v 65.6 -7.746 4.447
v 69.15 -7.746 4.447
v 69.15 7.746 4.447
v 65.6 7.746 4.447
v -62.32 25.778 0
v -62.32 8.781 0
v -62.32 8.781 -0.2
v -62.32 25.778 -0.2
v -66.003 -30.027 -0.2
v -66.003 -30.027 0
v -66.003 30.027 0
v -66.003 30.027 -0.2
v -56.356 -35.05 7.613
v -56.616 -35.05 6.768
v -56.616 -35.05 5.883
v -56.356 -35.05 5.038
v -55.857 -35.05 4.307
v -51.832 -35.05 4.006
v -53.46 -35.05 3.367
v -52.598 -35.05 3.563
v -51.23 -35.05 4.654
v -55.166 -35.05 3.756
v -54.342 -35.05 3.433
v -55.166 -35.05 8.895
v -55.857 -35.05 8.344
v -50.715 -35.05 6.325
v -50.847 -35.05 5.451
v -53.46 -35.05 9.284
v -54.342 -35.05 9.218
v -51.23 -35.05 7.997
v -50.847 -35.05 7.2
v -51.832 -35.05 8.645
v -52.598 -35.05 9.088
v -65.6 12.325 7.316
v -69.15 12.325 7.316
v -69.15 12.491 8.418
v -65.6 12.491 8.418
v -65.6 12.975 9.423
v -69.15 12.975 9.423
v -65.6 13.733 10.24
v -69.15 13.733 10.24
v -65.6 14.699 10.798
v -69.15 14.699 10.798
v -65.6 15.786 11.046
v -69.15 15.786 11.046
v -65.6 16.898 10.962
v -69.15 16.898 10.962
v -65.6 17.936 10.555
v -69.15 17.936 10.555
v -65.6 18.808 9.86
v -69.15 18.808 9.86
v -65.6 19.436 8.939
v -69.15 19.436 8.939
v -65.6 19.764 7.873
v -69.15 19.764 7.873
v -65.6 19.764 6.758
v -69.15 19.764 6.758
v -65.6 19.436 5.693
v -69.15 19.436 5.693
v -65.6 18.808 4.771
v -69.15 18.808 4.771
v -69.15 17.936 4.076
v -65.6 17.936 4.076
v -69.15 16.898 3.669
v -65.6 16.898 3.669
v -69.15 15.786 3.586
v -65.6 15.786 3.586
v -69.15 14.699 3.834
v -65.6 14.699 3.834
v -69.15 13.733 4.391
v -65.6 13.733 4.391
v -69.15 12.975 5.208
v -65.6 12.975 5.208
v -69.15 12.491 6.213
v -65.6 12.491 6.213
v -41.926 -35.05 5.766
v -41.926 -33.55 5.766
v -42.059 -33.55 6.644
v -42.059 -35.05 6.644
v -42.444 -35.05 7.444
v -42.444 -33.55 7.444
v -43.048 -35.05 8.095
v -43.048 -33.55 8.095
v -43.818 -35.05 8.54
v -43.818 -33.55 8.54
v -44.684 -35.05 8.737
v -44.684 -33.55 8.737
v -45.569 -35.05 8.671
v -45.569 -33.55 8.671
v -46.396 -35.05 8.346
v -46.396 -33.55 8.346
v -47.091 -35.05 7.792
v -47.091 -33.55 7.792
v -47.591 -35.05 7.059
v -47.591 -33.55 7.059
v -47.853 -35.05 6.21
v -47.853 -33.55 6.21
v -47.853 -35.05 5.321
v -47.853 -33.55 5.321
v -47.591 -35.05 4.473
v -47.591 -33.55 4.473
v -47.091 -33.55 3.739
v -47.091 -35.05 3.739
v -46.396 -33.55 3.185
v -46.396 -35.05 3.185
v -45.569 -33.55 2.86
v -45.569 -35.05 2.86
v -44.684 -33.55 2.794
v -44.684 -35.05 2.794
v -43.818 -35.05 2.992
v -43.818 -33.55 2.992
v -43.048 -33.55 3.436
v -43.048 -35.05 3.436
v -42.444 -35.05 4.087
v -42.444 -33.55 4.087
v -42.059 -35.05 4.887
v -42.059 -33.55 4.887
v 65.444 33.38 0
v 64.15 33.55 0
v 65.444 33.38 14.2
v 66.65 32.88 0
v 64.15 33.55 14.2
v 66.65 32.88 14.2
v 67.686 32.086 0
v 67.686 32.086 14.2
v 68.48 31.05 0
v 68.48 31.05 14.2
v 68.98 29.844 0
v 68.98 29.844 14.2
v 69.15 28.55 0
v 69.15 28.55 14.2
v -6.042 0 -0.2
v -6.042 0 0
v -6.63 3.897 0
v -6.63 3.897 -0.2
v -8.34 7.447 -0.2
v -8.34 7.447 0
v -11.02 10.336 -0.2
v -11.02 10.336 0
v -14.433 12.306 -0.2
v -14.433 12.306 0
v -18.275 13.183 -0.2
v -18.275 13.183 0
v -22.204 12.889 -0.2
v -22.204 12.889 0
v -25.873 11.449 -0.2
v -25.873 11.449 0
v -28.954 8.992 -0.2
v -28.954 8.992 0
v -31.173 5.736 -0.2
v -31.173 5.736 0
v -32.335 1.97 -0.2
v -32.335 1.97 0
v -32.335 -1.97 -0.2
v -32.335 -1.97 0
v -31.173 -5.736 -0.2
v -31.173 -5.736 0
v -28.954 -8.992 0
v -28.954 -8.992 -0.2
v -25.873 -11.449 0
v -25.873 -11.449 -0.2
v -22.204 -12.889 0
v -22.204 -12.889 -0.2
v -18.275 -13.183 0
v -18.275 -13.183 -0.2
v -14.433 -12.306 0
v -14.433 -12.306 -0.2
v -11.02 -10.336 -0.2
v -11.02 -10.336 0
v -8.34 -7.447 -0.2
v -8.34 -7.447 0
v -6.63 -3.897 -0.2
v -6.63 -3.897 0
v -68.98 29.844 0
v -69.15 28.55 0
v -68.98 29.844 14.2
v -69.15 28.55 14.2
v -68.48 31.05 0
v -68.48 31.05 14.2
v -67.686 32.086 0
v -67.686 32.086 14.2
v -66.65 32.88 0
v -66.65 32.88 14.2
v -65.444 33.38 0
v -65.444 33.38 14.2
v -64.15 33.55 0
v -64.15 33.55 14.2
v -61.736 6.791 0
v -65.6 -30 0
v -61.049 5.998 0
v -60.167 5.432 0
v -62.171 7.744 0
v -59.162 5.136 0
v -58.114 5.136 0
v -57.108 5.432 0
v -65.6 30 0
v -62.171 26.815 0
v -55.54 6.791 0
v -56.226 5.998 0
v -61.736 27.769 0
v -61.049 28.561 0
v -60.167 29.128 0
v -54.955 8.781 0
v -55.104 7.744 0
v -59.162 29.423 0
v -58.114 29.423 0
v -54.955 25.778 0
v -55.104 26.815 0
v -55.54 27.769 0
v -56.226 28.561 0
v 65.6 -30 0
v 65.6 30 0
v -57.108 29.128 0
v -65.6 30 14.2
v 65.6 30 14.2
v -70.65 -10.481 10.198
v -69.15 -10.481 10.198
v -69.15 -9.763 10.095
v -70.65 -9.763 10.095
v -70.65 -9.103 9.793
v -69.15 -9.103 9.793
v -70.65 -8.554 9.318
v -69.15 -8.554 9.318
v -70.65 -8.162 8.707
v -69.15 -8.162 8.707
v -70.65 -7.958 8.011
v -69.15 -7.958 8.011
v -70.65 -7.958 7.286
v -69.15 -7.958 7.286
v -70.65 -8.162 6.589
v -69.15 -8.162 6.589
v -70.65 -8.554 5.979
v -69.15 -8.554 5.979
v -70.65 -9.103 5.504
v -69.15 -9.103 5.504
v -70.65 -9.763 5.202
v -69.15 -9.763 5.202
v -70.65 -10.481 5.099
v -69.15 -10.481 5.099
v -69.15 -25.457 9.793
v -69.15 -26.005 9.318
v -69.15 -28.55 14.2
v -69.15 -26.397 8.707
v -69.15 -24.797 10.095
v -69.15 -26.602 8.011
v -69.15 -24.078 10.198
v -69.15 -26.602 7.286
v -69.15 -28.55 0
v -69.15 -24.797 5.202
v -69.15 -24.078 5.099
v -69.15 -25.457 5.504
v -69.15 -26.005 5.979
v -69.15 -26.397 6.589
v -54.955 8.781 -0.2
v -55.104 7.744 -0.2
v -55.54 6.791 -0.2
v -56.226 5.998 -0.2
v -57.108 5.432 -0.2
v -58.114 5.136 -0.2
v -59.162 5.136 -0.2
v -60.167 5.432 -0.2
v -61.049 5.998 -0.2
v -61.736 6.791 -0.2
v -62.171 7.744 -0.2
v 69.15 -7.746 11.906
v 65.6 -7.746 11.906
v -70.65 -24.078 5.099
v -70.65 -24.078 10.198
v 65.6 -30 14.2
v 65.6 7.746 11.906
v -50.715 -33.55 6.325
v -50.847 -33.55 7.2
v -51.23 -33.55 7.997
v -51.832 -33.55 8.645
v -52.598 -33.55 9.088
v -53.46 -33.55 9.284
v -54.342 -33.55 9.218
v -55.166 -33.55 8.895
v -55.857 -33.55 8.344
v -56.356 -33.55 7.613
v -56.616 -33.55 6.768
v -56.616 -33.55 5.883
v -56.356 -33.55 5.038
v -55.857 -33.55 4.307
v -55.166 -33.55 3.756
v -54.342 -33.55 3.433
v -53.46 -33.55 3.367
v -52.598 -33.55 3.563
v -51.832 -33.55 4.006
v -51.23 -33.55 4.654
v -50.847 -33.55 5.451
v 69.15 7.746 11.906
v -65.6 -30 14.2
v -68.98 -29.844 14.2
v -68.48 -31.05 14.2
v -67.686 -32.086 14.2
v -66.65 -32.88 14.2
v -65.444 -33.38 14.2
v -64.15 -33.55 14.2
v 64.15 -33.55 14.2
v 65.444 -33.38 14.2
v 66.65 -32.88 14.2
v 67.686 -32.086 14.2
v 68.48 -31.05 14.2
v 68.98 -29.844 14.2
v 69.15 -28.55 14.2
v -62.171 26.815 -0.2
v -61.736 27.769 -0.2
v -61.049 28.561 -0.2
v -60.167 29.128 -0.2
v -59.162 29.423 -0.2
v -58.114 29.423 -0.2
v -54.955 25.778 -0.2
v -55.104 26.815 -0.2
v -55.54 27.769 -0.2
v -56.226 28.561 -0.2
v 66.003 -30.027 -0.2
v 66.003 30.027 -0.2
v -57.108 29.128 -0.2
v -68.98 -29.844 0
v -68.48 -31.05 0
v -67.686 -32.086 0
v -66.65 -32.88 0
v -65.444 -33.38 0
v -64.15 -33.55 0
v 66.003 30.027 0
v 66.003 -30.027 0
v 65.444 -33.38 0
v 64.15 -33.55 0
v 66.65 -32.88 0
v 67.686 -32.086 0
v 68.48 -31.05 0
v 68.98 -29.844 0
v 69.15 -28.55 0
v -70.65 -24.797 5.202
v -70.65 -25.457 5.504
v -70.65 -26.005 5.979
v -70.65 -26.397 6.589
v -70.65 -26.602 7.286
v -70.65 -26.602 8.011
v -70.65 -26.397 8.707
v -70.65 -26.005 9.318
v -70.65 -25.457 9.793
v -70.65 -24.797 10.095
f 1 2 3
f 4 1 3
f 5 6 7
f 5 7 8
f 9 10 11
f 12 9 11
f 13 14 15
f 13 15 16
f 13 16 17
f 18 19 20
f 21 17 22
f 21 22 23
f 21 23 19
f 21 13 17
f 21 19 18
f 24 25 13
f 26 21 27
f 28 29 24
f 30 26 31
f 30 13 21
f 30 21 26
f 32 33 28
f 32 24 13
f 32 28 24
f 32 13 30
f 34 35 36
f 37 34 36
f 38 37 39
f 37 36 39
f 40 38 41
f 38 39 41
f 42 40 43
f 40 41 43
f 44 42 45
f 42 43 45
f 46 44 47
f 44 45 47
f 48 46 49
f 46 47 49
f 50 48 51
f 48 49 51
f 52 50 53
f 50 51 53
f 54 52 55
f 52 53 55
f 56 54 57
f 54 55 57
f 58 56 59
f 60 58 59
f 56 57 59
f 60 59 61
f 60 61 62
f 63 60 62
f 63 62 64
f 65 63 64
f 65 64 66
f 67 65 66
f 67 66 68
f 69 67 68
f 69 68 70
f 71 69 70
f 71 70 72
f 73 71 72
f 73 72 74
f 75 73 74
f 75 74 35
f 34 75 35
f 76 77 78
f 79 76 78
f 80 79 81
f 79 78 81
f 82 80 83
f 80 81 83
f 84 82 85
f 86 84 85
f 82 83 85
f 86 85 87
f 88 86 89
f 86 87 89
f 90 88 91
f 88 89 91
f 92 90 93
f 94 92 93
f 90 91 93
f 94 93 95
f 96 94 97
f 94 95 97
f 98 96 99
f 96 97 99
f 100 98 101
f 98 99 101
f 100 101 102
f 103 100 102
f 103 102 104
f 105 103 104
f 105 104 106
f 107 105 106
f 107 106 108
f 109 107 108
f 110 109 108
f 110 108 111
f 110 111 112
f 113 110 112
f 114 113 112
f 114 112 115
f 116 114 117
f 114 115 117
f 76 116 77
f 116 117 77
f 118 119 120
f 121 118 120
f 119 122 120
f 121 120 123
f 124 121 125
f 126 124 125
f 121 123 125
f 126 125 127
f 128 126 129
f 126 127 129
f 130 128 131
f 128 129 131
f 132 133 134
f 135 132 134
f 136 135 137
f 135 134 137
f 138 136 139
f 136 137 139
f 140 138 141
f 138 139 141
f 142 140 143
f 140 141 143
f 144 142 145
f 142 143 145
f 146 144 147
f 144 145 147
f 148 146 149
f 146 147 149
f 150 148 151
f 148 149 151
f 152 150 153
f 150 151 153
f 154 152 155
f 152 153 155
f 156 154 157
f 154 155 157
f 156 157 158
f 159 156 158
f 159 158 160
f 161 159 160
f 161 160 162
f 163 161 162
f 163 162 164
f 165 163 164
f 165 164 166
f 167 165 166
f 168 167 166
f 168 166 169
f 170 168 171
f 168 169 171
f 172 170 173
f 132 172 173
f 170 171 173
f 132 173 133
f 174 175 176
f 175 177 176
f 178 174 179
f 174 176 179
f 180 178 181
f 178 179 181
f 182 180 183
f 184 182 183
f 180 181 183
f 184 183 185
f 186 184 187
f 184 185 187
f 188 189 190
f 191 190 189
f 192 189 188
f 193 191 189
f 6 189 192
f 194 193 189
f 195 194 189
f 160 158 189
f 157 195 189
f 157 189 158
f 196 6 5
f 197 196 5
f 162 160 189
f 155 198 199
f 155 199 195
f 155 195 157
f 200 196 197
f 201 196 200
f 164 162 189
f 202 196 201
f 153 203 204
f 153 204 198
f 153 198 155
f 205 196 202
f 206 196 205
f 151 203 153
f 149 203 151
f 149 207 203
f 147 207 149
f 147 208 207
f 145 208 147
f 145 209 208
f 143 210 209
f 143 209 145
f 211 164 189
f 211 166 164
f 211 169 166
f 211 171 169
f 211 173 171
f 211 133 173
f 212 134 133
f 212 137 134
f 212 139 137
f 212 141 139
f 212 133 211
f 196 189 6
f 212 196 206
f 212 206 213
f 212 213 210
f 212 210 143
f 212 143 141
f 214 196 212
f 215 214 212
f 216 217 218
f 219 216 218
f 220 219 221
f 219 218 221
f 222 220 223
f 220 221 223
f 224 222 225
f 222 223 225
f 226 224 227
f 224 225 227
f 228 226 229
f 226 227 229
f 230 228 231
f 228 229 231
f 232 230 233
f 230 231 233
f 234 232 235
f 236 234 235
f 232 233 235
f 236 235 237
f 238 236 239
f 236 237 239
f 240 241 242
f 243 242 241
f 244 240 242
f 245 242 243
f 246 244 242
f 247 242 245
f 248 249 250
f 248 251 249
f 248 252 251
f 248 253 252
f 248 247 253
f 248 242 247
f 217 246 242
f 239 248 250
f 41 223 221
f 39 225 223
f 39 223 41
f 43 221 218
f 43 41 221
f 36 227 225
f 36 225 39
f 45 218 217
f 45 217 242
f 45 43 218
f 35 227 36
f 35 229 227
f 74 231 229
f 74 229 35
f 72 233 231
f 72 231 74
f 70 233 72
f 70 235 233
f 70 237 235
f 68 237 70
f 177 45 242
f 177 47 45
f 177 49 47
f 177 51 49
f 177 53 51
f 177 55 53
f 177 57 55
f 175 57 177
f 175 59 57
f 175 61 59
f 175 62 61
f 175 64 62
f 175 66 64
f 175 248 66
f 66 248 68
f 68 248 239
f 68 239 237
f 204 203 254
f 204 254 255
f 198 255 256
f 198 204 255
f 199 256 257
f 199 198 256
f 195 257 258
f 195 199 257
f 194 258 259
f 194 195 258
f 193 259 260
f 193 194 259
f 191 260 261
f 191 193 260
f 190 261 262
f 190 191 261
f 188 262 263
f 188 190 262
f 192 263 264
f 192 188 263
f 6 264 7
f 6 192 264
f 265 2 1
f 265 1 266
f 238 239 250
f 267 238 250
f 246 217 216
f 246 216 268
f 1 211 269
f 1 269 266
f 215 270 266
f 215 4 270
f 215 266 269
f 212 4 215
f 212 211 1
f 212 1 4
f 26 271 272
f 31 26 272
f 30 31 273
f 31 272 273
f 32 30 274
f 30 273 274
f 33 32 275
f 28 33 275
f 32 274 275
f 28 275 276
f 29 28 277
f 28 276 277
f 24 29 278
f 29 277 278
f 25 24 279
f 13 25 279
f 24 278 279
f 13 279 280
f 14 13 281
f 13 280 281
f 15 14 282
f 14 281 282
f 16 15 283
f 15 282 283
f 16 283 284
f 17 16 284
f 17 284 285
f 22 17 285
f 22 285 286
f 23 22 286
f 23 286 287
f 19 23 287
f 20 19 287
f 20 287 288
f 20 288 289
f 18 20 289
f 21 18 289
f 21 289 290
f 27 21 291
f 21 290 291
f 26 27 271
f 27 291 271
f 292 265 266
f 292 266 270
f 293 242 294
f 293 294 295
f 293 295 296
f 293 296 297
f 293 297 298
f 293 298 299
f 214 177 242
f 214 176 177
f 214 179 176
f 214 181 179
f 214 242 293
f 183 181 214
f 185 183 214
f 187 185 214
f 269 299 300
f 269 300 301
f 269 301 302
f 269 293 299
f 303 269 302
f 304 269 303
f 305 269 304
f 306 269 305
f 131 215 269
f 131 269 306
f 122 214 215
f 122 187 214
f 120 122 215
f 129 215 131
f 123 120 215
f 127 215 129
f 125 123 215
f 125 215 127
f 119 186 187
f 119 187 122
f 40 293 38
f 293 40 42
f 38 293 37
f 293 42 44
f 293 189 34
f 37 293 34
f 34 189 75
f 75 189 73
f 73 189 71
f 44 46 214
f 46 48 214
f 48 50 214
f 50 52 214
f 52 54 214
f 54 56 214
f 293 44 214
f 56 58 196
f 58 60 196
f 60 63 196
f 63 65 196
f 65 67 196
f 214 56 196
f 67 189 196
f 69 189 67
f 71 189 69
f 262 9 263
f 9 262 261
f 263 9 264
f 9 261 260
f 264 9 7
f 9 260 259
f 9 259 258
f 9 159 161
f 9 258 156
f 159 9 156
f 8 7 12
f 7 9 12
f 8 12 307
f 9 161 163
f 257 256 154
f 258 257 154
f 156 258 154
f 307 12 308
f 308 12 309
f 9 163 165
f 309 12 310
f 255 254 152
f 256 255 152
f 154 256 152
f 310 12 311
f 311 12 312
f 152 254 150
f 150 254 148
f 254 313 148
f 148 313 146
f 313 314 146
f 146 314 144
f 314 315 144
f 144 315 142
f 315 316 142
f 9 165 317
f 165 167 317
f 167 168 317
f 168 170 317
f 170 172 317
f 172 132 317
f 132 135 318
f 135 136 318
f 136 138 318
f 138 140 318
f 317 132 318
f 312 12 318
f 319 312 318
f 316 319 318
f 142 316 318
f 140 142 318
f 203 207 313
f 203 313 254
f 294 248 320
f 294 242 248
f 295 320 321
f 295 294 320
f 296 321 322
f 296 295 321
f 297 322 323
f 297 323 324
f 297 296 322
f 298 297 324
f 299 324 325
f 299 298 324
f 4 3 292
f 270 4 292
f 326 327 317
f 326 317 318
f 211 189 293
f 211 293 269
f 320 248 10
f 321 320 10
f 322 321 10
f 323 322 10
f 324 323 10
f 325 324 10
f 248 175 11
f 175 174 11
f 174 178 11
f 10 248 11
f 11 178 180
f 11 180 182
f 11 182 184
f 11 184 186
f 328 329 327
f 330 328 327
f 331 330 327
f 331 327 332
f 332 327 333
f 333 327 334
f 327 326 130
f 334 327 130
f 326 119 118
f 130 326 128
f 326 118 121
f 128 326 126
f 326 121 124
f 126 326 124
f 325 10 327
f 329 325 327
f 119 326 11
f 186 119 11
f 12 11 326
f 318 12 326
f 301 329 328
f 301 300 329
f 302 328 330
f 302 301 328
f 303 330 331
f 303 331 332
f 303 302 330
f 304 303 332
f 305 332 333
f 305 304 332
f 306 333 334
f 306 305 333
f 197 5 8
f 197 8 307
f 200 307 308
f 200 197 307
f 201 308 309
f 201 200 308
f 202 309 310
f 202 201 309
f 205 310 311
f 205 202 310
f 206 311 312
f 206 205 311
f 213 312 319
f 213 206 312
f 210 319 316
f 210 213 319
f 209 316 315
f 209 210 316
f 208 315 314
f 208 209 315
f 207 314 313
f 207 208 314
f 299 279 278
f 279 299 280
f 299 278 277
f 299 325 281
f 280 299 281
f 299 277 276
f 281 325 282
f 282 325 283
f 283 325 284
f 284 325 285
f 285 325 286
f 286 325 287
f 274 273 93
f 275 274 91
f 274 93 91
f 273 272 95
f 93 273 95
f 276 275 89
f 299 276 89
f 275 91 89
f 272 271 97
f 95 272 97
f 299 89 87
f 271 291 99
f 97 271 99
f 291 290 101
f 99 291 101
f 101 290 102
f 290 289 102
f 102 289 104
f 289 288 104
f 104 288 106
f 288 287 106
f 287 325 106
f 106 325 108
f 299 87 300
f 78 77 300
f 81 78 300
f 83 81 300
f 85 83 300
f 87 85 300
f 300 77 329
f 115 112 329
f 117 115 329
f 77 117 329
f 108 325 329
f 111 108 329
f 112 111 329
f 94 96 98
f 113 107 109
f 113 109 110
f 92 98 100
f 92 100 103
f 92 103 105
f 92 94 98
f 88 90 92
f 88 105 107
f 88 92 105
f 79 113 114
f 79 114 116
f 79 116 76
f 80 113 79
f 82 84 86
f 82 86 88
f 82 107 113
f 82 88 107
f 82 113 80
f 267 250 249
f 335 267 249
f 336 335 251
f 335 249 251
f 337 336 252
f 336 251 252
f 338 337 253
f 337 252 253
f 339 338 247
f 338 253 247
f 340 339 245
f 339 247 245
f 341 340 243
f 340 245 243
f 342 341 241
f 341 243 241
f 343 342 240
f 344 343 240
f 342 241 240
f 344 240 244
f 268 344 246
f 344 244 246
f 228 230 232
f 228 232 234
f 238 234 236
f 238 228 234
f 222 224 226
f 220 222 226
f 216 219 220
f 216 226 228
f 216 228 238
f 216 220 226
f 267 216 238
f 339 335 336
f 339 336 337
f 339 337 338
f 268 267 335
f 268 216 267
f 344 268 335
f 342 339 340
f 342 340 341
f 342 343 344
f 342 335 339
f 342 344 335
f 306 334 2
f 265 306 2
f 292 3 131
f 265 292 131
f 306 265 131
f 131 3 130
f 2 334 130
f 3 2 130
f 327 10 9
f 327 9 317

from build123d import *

# Parameters (mm, degrees)
F0_W      = 138.3
F0_H      = 67.1
F0_W_2    = 131.2
F0_H_2    = 60
F1_DEPTH  = 14.2
F2_R      = 5
F3_W      = 132.005408
F3_H      = 60.05396
F3_R      = 13.2201
F4_DEPTH  = 0.2
F5_R      = 2.967269
F5_R_2    = 2.980013
F6_DEPTH  = 1.5
F7_W      = 13.59712
F7_H      = 5.098922
F8_DEPTH  = 1.5
F9_R      = 3.740527
F10_DEPTH = 24
F11_W     = 15.491804
F11_H     = 7.459016
F12_DEPTH = 25


with BuildPart() as f1:
    # F0 (on Top) → F1 (new body)
    with BuildSketch(Plane.XY):
        Rectangle(F0_W, F0_H)
        Rectangle(F0_W_2, F0_H_2, mode=Mode.SUBTRACT)
    extrude(amount=F1_DEPTH)

    # F2
    f2_edges = [f1.edges().sort_by_distance(p)[0] for p in [
        (69.15, 33.55, 7.1),
        (69.15, -33.55, 7.1),
        (-69.15, -33.55, 7.1),
        (-69.15, 33.55, 7.1),
    ]]
    fillet(f2_edges, radius=F2_R)

    # F3 (on Top) → F4 (join)
    with BuildSketch(Plane.XY):
        Rectangle(F3_W, F3_H)
        with Locations((-19.262591, 0)):
            Circle(F3_R, mode=Mode.SUBTRACT)
        with BuildLine():
            ThreePointArc((-62.320147, 25.777878), (-58.637593, 29.460432), (-54.955039, 25.777878))
            Line((-54.955039, 25.777878), (-54.955039, 8.781476))
            ThreePointArc((-54.955039, 8.781476), (-58.637593, 5.098922), (-62.320147, 8.781476))
            Line((-62.320147, 8.781476), (-62.320147, 25.777878))
        make_face(mode=Mode.SUBTRACT)
    extrude(amount=-F4_DEPTH)

    # F5 (on face) → F6 (join)
    with BuildSketch(Plane.XZ.offset(33.55)):
        with Locations((-53.682171, 6.325473)):
            Circle(F5_R)
        with Locations((-44.906233, 5.765563)):
            Circle(F5_R_2)
    extrude(amount=F6_DEPTH)

    # F7 (on face) → F8 (join)
    with BuildSketch(Plane(origin=(-69.15, 0, 0), x_dir=(0, -1, 0), z_dir=(-1, 0, 0))):
        with Locations((17.279675, 7.648382)):
            Rectangle(F7_W, F7_H)
        with BuildLine():
            Line((24.078235, 10.197843), (24.078235, 5.098921))
            ThreePointArc((24.078235, 5.098921), (26.627696, 7.648382), (24.078235, 10.197843))
        make_face()
        with BuildLine():
            ThreePointArc((10.481115, 10.197843), (7.931654, 7.648382), (10.481115, 5.098921))
            Line((10.481115, 5.098921), (10.481115, 10.197843))
        make_face()
    extrude(amount=F8_DEPTH)

    # F9 (on face) → F10 (cut)
    with BuildSketch(Plane(origin=(-69.15, 0, 0), x_dir=(0, -1, 0), z_dir=(-1, 0, 0))):
        with Locations((-16.065575, 7.315574)):
            Circle(F9_R)
    extrude(amount=-F10_DEPTH, mode=Mode.SUBTRACT)

    # F11 (on face) → F12 (cut)
    with BuildSketch(Plane.YZ.offset(69.15)):
        with Locations((0, 8.17623)):
            Rectangle(F11_W, F11_H)
    extrude(amount=-F12_DEPTH, mode=Mode.SUBTRACT)


solid = f1.part
